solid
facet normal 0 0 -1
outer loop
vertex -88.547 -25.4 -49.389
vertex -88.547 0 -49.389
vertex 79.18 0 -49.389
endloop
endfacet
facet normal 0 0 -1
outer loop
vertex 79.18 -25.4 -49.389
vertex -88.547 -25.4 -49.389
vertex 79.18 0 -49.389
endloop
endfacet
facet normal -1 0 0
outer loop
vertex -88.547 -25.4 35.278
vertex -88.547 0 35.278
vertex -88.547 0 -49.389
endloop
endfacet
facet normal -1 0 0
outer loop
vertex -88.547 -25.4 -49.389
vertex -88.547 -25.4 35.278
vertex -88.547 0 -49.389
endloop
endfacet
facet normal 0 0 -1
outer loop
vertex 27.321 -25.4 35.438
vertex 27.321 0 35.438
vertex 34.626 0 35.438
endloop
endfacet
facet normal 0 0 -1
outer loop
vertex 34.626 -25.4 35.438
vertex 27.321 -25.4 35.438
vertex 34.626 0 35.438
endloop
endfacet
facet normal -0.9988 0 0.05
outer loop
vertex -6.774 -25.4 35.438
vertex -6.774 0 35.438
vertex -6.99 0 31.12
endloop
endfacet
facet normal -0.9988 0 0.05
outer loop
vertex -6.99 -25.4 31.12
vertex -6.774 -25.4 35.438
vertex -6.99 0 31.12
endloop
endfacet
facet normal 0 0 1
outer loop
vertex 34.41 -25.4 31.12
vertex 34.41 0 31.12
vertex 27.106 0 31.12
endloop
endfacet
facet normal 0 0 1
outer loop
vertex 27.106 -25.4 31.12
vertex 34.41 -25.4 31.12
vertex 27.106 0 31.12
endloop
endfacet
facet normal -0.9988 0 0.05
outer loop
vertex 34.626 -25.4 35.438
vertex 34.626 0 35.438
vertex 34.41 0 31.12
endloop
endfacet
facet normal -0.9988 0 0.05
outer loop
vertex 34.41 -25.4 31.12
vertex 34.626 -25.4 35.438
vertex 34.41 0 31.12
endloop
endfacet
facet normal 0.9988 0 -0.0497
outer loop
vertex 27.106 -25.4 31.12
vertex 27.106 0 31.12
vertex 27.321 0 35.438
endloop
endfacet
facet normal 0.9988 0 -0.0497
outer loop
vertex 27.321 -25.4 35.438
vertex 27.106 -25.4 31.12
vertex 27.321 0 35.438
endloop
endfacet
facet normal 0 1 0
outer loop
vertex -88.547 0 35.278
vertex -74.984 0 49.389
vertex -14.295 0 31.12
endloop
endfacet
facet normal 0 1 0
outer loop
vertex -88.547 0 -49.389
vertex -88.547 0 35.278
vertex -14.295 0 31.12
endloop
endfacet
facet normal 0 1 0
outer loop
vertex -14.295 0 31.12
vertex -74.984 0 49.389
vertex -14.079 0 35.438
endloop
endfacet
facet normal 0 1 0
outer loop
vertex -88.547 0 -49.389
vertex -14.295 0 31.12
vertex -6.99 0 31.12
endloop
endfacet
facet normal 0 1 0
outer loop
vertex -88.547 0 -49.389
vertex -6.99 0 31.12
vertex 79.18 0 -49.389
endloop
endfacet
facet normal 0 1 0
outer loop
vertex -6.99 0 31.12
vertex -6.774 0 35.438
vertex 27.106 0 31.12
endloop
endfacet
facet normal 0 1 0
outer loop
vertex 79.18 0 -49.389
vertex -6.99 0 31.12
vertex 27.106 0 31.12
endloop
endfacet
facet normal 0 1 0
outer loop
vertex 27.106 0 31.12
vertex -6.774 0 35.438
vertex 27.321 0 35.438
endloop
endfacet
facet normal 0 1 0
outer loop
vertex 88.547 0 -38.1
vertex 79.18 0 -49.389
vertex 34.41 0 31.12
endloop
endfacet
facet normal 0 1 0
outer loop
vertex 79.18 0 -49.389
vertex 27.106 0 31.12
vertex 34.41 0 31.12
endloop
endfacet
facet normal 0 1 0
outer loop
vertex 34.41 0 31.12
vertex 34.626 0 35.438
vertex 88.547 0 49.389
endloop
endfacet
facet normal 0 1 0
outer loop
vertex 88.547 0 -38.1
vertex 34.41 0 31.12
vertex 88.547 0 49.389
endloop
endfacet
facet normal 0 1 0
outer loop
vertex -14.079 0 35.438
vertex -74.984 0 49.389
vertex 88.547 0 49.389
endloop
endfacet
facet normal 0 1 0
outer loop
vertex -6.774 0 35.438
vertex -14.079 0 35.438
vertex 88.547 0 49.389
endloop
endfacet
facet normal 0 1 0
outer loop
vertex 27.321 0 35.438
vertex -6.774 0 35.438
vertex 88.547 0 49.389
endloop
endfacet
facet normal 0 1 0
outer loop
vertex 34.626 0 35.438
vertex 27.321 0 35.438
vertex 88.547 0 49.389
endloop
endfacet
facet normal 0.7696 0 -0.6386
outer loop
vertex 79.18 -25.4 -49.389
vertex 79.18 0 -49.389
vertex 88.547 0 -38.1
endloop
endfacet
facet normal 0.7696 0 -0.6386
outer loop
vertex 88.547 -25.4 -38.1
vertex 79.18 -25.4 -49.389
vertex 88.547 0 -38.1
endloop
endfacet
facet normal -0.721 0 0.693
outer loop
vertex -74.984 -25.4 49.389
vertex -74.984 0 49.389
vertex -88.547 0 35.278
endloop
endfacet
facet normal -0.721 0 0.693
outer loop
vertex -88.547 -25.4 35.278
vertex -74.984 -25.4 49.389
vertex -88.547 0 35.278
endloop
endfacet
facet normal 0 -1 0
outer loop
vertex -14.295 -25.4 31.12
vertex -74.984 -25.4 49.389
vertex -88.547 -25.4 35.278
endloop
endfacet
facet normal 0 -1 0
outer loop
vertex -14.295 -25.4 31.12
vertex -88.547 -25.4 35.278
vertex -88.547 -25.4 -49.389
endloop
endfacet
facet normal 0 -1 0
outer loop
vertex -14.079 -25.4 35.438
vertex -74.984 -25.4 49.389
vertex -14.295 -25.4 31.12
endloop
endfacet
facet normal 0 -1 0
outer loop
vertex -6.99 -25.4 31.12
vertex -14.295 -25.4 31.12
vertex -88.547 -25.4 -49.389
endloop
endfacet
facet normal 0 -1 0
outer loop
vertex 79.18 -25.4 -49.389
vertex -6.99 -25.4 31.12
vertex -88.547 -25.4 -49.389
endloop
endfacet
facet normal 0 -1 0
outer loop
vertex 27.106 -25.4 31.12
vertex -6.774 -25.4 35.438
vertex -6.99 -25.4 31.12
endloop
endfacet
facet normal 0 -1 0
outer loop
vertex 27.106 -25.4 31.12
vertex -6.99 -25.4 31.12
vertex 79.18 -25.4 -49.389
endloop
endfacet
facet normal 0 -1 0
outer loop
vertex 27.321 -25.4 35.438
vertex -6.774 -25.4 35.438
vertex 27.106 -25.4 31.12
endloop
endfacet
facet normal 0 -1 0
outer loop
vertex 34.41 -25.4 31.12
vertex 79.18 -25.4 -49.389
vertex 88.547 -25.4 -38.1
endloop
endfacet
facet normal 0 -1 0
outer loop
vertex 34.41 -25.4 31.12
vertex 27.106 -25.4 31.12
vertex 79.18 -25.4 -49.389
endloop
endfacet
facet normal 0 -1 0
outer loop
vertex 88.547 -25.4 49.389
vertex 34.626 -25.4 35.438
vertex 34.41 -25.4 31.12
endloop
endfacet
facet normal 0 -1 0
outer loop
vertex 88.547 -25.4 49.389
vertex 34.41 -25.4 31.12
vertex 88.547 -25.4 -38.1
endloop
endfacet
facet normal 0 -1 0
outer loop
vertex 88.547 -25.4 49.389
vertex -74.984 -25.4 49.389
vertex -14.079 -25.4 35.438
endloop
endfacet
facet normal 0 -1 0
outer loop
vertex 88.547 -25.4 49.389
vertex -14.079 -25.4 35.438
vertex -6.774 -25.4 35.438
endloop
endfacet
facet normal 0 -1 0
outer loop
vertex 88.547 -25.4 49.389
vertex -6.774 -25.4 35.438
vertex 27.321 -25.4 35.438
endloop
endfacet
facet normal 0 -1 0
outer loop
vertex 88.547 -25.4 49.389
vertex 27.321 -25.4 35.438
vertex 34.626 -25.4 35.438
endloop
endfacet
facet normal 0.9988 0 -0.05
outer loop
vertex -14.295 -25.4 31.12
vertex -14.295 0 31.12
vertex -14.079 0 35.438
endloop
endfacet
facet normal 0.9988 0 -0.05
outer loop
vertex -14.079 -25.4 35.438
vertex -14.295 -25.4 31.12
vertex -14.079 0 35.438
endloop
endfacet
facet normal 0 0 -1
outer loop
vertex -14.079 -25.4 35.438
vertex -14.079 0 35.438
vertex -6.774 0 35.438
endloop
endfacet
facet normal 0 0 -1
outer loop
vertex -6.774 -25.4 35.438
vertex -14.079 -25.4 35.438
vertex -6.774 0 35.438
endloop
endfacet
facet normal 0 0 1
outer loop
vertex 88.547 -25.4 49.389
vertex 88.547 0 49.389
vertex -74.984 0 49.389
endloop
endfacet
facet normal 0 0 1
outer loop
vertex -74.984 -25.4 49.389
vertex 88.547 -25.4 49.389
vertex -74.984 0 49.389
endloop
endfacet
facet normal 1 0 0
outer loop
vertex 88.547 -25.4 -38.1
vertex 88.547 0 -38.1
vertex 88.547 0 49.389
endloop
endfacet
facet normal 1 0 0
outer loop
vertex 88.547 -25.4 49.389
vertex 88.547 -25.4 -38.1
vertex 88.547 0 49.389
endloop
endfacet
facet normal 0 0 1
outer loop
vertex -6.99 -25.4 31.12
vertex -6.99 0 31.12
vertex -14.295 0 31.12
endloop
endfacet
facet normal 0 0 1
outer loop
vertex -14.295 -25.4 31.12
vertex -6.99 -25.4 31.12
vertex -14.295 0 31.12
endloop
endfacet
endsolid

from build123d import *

# Parameters (mm, degrees)
F1_DEPTH = 25.4


with BuildPart() as f1:
    # F0 (on Front) → F1 (new body)
    with BuildSketch(Plane.XZ):
        Polygon((88.547136, 49.388889), (-74.983796, 49.388889), (-88.547136, 35.277778), (-88.547136, -49.388889), (79.179921, -49.388889), (88.547136, -38.1), align=None)
        Polygon((-14.294649, 31.119892), (-14.078641, 35.438147), (-6.774006, 35.438147), (-6.989841, 31.119892), align=None, mode=Mode.SUBTRACT)
        Polygon((27.10558, 31.119892), (27.321243, 35.438147), (34.626224, 35.438147), (34.410216, 31.119892), align=None, mode=Mode.SUBTRACT)
    extrude(amount=F1_DEPTH)


solid = f1.part
